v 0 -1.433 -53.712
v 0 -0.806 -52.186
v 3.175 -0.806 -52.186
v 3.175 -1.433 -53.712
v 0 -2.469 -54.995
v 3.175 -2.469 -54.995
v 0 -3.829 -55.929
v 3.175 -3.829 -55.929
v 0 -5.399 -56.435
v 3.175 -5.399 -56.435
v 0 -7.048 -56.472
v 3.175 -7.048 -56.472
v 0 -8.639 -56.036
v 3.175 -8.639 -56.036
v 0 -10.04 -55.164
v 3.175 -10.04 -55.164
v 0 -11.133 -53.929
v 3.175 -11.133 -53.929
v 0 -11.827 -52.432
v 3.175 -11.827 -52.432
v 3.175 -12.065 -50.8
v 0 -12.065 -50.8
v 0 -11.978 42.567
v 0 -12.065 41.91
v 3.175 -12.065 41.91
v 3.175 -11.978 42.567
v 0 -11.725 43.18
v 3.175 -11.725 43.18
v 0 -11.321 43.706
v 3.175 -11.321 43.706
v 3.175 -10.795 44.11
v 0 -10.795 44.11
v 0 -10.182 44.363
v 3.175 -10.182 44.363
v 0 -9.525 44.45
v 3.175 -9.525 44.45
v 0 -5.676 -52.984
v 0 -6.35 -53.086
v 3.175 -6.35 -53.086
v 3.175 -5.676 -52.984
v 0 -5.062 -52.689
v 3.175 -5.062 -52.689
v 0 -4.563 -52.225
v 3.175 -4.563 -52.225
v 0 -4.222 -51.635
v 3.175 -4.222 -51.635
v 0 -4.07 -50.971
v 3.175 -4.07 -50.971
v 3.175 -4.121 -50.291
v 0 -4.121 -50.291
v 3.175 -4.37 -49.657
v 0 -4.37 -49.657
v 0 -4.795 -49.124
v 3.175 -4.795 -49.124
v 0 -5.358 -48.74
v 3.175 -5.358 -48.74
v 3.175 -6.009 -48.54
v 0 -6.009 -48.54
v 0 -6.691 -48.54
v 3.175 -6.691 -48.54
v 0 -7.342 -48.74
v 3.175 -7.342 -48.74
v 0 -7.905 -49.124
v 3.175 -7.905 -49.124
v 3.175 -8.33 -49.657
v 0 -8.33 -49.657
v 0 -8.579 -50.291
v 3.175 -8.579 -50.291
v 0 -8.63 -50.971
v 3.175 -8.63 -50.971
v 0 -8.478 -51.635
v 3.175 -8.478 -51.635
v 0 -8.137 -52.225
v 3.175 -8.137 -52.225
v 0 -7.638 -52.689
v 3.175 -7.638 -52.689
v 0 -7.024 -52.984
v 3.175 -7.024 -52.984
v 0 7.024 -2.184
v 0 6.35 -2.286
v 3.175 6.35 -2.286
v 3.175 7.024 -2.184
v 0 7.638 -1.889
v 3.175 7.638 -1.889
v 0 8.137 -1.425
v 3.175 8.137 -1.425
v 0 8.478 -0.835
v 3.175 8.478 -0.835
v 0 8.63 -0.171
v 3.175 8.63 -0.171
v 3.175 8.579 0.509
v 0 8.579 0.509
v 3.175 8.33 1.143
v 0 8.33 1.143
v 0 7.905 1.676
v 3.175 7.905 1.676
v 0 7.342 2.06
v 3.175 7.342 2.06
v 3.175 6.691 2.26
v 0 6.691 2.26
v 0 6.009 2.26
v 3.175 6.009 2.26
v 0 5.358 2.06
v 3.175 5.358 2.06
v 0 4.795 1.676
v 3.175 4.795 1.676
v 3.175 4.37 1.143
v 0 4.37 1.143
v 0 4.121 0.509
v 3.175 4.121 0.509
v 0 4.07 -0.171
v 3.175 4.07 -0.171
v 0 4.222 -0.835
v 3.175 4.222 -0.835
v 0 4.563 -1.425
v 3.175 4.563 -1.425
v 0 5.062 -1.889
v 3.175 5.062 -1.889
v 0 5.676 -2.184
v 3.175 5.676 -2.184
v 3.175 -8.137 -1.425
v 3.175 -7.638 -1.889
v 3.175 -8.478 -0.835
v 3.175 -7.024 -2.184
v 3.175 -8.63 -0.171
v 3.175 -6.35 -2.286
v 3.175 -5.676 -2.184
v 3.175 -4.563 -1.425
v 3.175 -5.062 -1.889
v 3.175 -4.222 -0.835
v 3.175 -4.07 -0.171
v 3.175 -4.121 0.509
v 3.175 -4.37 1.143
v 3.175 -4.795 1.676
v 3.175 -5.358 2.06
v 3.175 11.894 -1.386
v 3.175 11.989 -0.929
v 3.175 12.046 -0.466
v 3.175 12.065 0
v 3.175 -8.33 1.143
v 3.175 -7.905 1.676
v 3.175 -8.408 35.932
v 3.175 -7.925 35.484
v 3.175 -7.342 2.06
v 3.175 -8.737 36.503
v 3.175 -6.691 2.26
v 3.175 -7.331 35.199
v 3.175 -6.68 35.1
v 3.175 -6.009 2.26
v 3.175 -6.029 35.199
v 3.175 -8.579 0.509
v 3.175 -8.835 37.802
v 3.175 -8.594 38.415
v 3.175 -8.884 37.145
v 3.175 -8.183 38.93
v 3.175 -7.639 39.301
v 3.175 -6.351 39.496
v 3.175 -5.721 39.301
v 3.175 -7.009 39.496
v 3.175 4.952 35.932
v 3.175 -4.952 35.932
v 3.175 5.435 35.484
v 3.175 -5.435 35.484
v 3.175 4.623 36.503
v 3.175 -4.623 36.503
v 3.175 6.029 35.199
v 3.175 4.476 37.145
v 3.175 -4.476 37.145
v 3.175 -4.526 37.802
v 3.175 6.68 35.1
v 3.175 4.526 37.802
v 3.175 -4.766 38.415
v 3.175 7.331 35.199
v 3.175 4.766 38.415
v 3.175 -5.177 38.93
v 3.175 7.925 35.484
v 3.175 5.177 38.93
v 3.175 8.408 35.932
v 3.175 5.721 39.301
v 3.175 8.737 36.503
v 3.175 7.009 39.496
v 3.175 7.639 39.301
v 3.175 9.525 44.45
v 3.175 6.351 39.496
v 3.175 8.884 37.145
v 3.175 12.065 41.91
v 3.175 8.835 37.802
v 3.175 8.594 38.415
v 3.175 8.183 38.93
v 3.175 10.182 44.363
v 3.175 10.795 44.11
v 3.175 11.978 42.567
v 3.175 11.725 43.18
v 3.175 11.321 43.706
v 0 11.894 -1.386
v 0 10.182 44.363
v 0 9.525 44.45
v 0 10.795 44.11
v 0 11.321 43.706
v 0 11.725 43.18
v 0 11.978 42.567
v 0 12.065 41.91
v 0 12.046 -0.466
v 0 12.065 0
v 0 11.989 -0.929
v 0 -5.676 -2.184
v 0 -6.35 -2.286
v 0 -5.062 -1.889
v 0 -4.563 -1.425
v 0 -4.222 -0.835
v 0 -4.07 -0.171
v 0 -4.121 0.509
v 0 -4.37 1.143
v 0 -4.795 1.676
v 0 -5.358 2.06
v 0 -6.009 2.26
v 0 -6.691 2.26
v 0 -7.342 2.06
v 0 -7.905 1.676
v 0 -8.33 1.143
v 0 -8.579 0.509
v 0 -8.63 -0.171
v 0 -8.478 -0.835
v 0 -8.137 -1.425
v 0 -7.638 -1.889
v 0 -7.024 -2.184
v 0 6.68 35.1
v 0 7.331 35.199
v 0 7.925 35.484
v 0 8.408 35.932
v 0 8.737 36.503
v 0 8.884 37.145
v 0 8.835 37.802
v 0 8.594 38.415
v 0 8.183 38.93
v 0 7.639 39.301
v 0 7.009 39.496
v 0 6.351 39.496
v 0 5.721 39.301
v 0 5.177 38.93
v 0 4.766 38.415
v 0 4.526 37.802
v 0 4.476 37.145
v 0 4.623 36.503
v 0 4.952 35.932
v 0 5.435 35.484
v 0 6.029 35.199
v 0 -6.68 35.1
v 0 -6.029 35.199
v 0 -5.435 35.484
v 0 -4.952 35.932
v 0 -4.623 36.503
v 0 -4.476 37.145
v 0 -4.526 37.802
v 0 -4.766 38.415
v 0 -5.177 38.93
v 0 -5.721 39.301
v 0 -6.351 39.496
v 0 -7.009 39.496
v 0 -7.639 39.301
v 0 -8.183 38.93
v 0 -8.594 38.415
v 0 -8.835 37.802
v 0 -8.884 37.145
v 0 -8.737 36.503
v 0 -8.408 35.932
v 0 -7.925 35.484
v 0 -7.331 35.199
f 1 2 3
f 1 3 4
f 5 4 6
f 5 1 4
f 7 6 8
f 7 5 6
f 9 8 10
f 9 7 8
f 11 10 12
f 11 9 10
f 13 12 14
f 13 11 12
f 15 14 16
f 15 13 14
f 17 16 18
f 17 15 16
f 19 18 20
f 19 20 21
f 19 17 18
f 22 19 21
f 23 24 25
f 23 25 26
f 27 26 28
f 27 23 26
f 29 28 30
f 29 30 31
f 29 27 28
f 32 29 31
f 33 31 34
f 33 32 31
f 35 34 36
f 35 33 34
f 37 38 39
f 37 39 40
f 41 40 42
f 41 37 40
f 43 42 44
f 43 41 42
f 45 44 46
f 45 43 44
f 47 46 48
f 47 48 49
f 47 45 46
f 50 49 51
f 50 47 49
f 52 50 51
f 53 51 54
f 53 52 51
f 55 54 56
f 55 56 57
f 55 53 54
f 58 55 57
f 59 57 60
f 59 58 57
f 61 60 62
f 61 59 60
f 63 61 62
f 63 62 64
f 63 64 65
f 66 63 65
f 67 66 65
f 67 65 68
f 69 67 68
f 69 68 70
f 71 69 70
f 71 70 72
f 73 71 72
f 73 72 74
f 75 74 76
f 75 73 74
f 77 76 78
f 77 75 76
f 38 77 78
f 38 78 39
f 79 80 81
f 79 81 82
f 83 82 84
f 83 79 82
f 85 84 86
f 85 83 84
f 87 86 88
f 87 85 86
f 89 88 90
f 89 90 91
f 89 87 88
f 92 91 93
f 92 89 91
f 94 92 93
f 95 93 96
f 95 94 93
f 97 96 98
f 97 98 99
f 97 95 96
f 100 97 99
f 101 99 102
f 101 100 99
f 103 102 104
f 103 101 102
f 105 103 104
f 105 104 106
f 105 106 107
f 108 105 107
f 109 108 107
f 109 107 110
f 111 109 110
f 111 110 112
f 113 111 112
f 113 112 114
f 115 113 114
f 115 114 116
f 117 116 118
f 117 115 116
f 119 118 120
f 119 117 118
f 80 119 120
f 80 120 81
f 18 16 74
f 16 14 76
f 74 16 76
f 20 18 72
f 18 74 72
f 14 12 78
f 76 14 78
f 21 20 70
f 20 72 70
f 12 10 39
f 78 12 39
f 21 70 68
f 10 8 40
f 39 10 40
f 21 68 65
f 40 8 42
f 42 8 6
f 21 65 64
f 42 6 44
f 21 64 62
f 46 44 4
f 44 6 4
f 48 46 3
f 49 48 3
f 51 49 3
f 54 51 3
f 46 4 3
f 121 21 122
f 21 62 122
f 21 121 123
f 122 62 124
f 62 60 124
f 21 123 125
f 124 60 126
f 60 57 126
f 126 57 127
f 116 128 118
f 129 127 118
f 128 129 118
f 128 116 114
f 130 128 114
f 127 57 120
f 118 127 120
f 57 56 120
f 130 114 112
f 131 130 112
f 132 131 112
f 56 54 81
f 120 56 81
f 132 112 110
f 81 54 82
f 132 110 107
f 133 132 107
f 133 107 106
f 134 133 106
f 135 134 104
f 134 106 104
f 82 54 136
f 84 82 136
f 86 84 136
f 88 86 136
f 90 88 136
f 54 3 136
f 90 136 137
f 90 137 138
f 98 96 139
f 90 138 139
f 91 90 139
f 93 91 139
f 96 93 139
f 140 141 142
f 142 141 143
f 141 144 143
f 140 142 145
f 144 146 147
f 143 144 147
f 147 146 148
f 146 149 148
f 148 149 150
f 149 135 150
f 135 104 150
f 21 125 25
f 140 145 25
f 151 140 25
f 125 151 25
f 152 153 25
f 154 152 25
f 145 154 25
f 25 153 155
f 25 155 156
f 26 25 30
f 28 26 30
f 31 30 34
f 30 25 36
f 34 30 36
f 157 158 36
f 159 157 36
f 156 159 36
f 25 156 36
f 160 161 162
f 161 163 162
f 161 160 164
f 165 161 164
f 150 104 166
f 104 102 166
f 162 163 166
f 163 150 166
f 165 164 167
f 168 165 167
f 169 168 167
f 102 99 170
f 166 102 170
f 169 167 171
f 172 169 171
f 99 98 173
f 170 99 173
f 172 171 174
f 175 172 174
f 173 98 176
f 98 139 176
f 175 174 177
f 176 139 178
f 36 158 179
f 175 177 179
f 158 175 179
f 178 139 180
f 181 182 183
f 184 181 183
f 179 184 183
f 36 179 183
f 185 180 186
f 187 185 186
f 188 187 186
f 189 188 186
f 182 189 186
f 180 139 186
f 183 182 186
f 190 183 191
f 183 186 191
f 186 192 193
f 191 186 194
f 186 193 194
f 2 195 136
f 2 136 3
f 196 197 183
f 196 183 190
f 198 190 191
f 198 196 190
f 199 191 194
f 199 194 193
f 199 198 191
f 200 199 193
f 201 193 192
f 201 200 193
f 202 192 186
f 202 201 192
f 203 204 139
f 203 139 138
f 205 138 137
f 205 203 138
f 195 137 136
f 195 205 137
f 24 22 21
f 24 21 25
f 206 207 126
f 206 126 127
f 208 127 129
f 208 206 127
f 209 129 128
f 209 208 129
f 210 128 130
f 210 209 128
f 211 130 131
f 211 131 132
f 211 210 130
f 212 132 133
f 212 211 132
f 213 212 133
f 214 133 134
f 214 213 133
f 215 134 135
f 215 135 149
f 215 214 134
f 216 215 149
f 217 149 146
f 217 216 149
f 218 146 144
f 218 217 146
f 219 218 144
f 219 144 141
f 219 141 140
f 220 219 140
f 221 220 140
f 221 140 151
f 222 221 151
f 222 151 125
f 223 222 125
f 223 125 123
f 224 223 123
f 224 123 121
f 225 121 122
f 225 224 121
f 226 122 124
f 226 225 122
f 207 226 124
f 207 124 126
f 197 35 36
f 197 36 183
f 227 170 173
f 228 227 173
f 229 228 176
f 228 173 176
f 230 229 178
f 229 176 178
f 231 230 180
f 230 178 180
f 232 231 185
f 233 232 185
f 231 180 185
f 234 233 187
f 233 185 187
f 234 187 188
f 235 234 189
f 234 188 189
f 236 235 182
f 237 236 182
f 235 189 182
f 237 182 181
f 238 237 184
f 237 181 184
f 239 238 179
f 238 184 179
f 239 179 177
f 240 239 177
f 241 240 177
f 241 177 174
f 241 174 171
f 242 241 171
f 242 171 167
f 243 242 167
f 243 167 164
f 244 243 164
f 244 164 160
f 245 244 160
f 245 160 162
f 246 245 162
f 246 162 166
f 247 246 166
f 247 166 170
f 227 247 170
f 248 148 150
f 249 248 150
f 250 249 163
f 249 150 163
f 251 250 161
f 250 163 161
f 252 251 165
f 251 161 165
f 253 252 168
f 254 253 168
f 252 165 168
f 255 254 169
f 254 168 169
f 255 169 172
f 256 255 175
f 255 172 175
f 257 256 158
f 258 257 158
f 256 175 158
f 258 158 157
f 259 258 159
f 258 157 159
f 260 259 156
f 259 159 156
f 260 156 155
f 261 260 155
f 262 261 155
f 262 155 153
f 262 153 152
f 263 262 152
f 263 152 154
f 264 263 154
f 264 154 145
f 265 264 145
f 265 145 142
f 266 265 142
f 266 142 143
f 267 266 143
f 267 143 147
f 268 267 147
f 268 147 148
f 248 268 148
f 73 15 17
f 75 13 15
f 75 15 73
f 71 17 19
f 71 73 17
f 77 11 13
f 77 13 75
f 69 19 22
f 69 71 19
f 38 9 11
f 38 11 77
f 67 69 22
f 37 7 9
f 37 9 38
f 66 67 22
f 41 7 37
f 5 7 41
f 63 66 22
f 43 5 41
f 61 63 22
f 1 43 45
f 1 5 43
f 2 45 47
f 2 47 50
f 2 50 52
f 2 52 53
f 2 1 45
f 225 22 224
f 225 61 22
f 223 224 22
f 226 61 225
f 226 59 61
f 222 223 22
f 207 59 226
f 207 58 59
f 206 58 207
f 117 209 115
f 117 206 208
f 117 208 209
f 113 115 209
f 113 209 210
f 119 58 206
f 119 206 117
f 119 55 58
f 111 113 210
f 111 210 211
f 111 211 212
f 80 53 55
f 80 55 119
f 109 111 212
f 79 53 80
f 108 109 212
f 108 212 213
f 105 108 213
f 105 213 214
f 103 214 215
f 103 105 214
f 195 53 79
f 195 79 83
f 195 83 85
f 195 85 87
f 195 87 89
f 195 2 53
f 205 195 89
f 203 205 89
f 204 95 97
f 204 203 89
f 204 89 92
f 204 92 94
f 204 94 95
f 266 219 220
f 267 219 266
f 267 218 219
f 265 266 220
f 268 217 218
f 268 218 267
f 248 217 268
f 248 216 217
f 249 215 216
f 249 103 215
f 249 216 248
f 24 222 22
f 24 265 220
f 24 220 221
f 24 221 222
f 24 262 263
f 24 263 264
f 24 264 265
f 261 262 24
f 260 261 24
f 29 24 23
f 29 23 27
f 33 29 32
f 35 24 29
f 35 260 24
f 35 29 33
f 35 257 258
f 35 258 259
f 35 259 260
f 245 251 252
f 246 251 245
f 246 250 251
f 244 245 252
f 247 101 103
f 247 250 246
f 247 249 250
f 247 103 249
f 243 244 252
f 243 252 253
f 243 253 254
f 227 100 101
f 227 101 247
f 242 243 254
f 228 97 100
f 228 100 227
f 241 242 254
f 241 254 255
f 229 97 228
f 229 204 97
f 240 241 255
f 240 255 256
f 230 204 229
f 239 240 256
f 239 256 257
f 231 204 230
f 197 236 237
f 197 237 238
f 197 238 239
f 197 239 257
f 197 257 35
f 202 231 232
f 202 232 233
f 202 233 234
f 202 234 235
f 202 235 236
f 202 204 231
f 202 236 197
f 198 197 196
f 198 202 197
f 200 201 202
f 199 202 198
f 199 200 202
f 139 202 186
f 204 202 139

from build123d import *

# Parameters (mm, degrees)
SKETCH1_R           = 2.286
BOSS_EXTRUDE1_DEPTH = 3.175
SKETCH2_R           = 2.20991013
CUT_EXTRUDE1_DEPTH  = 58.875643193


with BuildPart() as part:
    # Sketch1 → Boss-Extrude1 (new body)
    with BuildSketch(Plane(origin=(0, 0, 0), x_dir=(0, 0, -1), z_dir=(1, 0, 0))):
        with BuildLine():
            Line((1.386091097, 11.894364388), (52.186091097, -0.805635612))
            ThreePointArc((52.186091097, -0.805635612), (56.472180686, -7.048277352), (50.8, -12.065))
            Line((50.8, -12.065), (0, -12.065))
            Line((0, -12.065), (-41.91, -12.065))
            ThreePointArc((-41.91, -12.065), (-43.706051224, -11.321051224), (-44.45, -9.525))
            Line((-44.45, -9.525), (-44.45, 9.525))
            ThreePointArc((-44.45, 9.525), (-43.706051224, 11.321051224), (-41.91, 12.065))
            Line((-41.91, 12.065), (0, 12.065))
            ThreePointArc((0, 12.065), (0.698277352, 12.022180686), (1.386091097, 11.894364388))
        make_face()
        with Locations((0, 6.35)):
            Circle(SKETCH1_R, mode=Mode.SUBTRACT)
        with Locations((0, -6.35)):
            Circle(SKETCH1_R, mode=Mode.SUBTRACT)
        with Locations((50.8, -6.35)):
            Circle(SKETCH1_R, mode=Mode.SUBTRACT)
    extrude(amount=BOSS_EXTRUDE1_DEPTH)

    # Sketch2 → Cut-Extrude1 (cut, through all)
    with BuildSketch(Plane(origin=(3.175, 0, 0), x_dir=(0, 0, -1), z_dir=(1, 0, 0))):
        with Locations((-37.310316922, 6.68008987)):
            Circle(SKETCH2_R)
        with Locations((-37.310316922, -6.68008987)):
            Circle(SKETCH2_R)
    extrude(amount=-CUT_EXTRUDE1_DEPTH, mode=Mode.SUBTRACT)


solid = part.part
